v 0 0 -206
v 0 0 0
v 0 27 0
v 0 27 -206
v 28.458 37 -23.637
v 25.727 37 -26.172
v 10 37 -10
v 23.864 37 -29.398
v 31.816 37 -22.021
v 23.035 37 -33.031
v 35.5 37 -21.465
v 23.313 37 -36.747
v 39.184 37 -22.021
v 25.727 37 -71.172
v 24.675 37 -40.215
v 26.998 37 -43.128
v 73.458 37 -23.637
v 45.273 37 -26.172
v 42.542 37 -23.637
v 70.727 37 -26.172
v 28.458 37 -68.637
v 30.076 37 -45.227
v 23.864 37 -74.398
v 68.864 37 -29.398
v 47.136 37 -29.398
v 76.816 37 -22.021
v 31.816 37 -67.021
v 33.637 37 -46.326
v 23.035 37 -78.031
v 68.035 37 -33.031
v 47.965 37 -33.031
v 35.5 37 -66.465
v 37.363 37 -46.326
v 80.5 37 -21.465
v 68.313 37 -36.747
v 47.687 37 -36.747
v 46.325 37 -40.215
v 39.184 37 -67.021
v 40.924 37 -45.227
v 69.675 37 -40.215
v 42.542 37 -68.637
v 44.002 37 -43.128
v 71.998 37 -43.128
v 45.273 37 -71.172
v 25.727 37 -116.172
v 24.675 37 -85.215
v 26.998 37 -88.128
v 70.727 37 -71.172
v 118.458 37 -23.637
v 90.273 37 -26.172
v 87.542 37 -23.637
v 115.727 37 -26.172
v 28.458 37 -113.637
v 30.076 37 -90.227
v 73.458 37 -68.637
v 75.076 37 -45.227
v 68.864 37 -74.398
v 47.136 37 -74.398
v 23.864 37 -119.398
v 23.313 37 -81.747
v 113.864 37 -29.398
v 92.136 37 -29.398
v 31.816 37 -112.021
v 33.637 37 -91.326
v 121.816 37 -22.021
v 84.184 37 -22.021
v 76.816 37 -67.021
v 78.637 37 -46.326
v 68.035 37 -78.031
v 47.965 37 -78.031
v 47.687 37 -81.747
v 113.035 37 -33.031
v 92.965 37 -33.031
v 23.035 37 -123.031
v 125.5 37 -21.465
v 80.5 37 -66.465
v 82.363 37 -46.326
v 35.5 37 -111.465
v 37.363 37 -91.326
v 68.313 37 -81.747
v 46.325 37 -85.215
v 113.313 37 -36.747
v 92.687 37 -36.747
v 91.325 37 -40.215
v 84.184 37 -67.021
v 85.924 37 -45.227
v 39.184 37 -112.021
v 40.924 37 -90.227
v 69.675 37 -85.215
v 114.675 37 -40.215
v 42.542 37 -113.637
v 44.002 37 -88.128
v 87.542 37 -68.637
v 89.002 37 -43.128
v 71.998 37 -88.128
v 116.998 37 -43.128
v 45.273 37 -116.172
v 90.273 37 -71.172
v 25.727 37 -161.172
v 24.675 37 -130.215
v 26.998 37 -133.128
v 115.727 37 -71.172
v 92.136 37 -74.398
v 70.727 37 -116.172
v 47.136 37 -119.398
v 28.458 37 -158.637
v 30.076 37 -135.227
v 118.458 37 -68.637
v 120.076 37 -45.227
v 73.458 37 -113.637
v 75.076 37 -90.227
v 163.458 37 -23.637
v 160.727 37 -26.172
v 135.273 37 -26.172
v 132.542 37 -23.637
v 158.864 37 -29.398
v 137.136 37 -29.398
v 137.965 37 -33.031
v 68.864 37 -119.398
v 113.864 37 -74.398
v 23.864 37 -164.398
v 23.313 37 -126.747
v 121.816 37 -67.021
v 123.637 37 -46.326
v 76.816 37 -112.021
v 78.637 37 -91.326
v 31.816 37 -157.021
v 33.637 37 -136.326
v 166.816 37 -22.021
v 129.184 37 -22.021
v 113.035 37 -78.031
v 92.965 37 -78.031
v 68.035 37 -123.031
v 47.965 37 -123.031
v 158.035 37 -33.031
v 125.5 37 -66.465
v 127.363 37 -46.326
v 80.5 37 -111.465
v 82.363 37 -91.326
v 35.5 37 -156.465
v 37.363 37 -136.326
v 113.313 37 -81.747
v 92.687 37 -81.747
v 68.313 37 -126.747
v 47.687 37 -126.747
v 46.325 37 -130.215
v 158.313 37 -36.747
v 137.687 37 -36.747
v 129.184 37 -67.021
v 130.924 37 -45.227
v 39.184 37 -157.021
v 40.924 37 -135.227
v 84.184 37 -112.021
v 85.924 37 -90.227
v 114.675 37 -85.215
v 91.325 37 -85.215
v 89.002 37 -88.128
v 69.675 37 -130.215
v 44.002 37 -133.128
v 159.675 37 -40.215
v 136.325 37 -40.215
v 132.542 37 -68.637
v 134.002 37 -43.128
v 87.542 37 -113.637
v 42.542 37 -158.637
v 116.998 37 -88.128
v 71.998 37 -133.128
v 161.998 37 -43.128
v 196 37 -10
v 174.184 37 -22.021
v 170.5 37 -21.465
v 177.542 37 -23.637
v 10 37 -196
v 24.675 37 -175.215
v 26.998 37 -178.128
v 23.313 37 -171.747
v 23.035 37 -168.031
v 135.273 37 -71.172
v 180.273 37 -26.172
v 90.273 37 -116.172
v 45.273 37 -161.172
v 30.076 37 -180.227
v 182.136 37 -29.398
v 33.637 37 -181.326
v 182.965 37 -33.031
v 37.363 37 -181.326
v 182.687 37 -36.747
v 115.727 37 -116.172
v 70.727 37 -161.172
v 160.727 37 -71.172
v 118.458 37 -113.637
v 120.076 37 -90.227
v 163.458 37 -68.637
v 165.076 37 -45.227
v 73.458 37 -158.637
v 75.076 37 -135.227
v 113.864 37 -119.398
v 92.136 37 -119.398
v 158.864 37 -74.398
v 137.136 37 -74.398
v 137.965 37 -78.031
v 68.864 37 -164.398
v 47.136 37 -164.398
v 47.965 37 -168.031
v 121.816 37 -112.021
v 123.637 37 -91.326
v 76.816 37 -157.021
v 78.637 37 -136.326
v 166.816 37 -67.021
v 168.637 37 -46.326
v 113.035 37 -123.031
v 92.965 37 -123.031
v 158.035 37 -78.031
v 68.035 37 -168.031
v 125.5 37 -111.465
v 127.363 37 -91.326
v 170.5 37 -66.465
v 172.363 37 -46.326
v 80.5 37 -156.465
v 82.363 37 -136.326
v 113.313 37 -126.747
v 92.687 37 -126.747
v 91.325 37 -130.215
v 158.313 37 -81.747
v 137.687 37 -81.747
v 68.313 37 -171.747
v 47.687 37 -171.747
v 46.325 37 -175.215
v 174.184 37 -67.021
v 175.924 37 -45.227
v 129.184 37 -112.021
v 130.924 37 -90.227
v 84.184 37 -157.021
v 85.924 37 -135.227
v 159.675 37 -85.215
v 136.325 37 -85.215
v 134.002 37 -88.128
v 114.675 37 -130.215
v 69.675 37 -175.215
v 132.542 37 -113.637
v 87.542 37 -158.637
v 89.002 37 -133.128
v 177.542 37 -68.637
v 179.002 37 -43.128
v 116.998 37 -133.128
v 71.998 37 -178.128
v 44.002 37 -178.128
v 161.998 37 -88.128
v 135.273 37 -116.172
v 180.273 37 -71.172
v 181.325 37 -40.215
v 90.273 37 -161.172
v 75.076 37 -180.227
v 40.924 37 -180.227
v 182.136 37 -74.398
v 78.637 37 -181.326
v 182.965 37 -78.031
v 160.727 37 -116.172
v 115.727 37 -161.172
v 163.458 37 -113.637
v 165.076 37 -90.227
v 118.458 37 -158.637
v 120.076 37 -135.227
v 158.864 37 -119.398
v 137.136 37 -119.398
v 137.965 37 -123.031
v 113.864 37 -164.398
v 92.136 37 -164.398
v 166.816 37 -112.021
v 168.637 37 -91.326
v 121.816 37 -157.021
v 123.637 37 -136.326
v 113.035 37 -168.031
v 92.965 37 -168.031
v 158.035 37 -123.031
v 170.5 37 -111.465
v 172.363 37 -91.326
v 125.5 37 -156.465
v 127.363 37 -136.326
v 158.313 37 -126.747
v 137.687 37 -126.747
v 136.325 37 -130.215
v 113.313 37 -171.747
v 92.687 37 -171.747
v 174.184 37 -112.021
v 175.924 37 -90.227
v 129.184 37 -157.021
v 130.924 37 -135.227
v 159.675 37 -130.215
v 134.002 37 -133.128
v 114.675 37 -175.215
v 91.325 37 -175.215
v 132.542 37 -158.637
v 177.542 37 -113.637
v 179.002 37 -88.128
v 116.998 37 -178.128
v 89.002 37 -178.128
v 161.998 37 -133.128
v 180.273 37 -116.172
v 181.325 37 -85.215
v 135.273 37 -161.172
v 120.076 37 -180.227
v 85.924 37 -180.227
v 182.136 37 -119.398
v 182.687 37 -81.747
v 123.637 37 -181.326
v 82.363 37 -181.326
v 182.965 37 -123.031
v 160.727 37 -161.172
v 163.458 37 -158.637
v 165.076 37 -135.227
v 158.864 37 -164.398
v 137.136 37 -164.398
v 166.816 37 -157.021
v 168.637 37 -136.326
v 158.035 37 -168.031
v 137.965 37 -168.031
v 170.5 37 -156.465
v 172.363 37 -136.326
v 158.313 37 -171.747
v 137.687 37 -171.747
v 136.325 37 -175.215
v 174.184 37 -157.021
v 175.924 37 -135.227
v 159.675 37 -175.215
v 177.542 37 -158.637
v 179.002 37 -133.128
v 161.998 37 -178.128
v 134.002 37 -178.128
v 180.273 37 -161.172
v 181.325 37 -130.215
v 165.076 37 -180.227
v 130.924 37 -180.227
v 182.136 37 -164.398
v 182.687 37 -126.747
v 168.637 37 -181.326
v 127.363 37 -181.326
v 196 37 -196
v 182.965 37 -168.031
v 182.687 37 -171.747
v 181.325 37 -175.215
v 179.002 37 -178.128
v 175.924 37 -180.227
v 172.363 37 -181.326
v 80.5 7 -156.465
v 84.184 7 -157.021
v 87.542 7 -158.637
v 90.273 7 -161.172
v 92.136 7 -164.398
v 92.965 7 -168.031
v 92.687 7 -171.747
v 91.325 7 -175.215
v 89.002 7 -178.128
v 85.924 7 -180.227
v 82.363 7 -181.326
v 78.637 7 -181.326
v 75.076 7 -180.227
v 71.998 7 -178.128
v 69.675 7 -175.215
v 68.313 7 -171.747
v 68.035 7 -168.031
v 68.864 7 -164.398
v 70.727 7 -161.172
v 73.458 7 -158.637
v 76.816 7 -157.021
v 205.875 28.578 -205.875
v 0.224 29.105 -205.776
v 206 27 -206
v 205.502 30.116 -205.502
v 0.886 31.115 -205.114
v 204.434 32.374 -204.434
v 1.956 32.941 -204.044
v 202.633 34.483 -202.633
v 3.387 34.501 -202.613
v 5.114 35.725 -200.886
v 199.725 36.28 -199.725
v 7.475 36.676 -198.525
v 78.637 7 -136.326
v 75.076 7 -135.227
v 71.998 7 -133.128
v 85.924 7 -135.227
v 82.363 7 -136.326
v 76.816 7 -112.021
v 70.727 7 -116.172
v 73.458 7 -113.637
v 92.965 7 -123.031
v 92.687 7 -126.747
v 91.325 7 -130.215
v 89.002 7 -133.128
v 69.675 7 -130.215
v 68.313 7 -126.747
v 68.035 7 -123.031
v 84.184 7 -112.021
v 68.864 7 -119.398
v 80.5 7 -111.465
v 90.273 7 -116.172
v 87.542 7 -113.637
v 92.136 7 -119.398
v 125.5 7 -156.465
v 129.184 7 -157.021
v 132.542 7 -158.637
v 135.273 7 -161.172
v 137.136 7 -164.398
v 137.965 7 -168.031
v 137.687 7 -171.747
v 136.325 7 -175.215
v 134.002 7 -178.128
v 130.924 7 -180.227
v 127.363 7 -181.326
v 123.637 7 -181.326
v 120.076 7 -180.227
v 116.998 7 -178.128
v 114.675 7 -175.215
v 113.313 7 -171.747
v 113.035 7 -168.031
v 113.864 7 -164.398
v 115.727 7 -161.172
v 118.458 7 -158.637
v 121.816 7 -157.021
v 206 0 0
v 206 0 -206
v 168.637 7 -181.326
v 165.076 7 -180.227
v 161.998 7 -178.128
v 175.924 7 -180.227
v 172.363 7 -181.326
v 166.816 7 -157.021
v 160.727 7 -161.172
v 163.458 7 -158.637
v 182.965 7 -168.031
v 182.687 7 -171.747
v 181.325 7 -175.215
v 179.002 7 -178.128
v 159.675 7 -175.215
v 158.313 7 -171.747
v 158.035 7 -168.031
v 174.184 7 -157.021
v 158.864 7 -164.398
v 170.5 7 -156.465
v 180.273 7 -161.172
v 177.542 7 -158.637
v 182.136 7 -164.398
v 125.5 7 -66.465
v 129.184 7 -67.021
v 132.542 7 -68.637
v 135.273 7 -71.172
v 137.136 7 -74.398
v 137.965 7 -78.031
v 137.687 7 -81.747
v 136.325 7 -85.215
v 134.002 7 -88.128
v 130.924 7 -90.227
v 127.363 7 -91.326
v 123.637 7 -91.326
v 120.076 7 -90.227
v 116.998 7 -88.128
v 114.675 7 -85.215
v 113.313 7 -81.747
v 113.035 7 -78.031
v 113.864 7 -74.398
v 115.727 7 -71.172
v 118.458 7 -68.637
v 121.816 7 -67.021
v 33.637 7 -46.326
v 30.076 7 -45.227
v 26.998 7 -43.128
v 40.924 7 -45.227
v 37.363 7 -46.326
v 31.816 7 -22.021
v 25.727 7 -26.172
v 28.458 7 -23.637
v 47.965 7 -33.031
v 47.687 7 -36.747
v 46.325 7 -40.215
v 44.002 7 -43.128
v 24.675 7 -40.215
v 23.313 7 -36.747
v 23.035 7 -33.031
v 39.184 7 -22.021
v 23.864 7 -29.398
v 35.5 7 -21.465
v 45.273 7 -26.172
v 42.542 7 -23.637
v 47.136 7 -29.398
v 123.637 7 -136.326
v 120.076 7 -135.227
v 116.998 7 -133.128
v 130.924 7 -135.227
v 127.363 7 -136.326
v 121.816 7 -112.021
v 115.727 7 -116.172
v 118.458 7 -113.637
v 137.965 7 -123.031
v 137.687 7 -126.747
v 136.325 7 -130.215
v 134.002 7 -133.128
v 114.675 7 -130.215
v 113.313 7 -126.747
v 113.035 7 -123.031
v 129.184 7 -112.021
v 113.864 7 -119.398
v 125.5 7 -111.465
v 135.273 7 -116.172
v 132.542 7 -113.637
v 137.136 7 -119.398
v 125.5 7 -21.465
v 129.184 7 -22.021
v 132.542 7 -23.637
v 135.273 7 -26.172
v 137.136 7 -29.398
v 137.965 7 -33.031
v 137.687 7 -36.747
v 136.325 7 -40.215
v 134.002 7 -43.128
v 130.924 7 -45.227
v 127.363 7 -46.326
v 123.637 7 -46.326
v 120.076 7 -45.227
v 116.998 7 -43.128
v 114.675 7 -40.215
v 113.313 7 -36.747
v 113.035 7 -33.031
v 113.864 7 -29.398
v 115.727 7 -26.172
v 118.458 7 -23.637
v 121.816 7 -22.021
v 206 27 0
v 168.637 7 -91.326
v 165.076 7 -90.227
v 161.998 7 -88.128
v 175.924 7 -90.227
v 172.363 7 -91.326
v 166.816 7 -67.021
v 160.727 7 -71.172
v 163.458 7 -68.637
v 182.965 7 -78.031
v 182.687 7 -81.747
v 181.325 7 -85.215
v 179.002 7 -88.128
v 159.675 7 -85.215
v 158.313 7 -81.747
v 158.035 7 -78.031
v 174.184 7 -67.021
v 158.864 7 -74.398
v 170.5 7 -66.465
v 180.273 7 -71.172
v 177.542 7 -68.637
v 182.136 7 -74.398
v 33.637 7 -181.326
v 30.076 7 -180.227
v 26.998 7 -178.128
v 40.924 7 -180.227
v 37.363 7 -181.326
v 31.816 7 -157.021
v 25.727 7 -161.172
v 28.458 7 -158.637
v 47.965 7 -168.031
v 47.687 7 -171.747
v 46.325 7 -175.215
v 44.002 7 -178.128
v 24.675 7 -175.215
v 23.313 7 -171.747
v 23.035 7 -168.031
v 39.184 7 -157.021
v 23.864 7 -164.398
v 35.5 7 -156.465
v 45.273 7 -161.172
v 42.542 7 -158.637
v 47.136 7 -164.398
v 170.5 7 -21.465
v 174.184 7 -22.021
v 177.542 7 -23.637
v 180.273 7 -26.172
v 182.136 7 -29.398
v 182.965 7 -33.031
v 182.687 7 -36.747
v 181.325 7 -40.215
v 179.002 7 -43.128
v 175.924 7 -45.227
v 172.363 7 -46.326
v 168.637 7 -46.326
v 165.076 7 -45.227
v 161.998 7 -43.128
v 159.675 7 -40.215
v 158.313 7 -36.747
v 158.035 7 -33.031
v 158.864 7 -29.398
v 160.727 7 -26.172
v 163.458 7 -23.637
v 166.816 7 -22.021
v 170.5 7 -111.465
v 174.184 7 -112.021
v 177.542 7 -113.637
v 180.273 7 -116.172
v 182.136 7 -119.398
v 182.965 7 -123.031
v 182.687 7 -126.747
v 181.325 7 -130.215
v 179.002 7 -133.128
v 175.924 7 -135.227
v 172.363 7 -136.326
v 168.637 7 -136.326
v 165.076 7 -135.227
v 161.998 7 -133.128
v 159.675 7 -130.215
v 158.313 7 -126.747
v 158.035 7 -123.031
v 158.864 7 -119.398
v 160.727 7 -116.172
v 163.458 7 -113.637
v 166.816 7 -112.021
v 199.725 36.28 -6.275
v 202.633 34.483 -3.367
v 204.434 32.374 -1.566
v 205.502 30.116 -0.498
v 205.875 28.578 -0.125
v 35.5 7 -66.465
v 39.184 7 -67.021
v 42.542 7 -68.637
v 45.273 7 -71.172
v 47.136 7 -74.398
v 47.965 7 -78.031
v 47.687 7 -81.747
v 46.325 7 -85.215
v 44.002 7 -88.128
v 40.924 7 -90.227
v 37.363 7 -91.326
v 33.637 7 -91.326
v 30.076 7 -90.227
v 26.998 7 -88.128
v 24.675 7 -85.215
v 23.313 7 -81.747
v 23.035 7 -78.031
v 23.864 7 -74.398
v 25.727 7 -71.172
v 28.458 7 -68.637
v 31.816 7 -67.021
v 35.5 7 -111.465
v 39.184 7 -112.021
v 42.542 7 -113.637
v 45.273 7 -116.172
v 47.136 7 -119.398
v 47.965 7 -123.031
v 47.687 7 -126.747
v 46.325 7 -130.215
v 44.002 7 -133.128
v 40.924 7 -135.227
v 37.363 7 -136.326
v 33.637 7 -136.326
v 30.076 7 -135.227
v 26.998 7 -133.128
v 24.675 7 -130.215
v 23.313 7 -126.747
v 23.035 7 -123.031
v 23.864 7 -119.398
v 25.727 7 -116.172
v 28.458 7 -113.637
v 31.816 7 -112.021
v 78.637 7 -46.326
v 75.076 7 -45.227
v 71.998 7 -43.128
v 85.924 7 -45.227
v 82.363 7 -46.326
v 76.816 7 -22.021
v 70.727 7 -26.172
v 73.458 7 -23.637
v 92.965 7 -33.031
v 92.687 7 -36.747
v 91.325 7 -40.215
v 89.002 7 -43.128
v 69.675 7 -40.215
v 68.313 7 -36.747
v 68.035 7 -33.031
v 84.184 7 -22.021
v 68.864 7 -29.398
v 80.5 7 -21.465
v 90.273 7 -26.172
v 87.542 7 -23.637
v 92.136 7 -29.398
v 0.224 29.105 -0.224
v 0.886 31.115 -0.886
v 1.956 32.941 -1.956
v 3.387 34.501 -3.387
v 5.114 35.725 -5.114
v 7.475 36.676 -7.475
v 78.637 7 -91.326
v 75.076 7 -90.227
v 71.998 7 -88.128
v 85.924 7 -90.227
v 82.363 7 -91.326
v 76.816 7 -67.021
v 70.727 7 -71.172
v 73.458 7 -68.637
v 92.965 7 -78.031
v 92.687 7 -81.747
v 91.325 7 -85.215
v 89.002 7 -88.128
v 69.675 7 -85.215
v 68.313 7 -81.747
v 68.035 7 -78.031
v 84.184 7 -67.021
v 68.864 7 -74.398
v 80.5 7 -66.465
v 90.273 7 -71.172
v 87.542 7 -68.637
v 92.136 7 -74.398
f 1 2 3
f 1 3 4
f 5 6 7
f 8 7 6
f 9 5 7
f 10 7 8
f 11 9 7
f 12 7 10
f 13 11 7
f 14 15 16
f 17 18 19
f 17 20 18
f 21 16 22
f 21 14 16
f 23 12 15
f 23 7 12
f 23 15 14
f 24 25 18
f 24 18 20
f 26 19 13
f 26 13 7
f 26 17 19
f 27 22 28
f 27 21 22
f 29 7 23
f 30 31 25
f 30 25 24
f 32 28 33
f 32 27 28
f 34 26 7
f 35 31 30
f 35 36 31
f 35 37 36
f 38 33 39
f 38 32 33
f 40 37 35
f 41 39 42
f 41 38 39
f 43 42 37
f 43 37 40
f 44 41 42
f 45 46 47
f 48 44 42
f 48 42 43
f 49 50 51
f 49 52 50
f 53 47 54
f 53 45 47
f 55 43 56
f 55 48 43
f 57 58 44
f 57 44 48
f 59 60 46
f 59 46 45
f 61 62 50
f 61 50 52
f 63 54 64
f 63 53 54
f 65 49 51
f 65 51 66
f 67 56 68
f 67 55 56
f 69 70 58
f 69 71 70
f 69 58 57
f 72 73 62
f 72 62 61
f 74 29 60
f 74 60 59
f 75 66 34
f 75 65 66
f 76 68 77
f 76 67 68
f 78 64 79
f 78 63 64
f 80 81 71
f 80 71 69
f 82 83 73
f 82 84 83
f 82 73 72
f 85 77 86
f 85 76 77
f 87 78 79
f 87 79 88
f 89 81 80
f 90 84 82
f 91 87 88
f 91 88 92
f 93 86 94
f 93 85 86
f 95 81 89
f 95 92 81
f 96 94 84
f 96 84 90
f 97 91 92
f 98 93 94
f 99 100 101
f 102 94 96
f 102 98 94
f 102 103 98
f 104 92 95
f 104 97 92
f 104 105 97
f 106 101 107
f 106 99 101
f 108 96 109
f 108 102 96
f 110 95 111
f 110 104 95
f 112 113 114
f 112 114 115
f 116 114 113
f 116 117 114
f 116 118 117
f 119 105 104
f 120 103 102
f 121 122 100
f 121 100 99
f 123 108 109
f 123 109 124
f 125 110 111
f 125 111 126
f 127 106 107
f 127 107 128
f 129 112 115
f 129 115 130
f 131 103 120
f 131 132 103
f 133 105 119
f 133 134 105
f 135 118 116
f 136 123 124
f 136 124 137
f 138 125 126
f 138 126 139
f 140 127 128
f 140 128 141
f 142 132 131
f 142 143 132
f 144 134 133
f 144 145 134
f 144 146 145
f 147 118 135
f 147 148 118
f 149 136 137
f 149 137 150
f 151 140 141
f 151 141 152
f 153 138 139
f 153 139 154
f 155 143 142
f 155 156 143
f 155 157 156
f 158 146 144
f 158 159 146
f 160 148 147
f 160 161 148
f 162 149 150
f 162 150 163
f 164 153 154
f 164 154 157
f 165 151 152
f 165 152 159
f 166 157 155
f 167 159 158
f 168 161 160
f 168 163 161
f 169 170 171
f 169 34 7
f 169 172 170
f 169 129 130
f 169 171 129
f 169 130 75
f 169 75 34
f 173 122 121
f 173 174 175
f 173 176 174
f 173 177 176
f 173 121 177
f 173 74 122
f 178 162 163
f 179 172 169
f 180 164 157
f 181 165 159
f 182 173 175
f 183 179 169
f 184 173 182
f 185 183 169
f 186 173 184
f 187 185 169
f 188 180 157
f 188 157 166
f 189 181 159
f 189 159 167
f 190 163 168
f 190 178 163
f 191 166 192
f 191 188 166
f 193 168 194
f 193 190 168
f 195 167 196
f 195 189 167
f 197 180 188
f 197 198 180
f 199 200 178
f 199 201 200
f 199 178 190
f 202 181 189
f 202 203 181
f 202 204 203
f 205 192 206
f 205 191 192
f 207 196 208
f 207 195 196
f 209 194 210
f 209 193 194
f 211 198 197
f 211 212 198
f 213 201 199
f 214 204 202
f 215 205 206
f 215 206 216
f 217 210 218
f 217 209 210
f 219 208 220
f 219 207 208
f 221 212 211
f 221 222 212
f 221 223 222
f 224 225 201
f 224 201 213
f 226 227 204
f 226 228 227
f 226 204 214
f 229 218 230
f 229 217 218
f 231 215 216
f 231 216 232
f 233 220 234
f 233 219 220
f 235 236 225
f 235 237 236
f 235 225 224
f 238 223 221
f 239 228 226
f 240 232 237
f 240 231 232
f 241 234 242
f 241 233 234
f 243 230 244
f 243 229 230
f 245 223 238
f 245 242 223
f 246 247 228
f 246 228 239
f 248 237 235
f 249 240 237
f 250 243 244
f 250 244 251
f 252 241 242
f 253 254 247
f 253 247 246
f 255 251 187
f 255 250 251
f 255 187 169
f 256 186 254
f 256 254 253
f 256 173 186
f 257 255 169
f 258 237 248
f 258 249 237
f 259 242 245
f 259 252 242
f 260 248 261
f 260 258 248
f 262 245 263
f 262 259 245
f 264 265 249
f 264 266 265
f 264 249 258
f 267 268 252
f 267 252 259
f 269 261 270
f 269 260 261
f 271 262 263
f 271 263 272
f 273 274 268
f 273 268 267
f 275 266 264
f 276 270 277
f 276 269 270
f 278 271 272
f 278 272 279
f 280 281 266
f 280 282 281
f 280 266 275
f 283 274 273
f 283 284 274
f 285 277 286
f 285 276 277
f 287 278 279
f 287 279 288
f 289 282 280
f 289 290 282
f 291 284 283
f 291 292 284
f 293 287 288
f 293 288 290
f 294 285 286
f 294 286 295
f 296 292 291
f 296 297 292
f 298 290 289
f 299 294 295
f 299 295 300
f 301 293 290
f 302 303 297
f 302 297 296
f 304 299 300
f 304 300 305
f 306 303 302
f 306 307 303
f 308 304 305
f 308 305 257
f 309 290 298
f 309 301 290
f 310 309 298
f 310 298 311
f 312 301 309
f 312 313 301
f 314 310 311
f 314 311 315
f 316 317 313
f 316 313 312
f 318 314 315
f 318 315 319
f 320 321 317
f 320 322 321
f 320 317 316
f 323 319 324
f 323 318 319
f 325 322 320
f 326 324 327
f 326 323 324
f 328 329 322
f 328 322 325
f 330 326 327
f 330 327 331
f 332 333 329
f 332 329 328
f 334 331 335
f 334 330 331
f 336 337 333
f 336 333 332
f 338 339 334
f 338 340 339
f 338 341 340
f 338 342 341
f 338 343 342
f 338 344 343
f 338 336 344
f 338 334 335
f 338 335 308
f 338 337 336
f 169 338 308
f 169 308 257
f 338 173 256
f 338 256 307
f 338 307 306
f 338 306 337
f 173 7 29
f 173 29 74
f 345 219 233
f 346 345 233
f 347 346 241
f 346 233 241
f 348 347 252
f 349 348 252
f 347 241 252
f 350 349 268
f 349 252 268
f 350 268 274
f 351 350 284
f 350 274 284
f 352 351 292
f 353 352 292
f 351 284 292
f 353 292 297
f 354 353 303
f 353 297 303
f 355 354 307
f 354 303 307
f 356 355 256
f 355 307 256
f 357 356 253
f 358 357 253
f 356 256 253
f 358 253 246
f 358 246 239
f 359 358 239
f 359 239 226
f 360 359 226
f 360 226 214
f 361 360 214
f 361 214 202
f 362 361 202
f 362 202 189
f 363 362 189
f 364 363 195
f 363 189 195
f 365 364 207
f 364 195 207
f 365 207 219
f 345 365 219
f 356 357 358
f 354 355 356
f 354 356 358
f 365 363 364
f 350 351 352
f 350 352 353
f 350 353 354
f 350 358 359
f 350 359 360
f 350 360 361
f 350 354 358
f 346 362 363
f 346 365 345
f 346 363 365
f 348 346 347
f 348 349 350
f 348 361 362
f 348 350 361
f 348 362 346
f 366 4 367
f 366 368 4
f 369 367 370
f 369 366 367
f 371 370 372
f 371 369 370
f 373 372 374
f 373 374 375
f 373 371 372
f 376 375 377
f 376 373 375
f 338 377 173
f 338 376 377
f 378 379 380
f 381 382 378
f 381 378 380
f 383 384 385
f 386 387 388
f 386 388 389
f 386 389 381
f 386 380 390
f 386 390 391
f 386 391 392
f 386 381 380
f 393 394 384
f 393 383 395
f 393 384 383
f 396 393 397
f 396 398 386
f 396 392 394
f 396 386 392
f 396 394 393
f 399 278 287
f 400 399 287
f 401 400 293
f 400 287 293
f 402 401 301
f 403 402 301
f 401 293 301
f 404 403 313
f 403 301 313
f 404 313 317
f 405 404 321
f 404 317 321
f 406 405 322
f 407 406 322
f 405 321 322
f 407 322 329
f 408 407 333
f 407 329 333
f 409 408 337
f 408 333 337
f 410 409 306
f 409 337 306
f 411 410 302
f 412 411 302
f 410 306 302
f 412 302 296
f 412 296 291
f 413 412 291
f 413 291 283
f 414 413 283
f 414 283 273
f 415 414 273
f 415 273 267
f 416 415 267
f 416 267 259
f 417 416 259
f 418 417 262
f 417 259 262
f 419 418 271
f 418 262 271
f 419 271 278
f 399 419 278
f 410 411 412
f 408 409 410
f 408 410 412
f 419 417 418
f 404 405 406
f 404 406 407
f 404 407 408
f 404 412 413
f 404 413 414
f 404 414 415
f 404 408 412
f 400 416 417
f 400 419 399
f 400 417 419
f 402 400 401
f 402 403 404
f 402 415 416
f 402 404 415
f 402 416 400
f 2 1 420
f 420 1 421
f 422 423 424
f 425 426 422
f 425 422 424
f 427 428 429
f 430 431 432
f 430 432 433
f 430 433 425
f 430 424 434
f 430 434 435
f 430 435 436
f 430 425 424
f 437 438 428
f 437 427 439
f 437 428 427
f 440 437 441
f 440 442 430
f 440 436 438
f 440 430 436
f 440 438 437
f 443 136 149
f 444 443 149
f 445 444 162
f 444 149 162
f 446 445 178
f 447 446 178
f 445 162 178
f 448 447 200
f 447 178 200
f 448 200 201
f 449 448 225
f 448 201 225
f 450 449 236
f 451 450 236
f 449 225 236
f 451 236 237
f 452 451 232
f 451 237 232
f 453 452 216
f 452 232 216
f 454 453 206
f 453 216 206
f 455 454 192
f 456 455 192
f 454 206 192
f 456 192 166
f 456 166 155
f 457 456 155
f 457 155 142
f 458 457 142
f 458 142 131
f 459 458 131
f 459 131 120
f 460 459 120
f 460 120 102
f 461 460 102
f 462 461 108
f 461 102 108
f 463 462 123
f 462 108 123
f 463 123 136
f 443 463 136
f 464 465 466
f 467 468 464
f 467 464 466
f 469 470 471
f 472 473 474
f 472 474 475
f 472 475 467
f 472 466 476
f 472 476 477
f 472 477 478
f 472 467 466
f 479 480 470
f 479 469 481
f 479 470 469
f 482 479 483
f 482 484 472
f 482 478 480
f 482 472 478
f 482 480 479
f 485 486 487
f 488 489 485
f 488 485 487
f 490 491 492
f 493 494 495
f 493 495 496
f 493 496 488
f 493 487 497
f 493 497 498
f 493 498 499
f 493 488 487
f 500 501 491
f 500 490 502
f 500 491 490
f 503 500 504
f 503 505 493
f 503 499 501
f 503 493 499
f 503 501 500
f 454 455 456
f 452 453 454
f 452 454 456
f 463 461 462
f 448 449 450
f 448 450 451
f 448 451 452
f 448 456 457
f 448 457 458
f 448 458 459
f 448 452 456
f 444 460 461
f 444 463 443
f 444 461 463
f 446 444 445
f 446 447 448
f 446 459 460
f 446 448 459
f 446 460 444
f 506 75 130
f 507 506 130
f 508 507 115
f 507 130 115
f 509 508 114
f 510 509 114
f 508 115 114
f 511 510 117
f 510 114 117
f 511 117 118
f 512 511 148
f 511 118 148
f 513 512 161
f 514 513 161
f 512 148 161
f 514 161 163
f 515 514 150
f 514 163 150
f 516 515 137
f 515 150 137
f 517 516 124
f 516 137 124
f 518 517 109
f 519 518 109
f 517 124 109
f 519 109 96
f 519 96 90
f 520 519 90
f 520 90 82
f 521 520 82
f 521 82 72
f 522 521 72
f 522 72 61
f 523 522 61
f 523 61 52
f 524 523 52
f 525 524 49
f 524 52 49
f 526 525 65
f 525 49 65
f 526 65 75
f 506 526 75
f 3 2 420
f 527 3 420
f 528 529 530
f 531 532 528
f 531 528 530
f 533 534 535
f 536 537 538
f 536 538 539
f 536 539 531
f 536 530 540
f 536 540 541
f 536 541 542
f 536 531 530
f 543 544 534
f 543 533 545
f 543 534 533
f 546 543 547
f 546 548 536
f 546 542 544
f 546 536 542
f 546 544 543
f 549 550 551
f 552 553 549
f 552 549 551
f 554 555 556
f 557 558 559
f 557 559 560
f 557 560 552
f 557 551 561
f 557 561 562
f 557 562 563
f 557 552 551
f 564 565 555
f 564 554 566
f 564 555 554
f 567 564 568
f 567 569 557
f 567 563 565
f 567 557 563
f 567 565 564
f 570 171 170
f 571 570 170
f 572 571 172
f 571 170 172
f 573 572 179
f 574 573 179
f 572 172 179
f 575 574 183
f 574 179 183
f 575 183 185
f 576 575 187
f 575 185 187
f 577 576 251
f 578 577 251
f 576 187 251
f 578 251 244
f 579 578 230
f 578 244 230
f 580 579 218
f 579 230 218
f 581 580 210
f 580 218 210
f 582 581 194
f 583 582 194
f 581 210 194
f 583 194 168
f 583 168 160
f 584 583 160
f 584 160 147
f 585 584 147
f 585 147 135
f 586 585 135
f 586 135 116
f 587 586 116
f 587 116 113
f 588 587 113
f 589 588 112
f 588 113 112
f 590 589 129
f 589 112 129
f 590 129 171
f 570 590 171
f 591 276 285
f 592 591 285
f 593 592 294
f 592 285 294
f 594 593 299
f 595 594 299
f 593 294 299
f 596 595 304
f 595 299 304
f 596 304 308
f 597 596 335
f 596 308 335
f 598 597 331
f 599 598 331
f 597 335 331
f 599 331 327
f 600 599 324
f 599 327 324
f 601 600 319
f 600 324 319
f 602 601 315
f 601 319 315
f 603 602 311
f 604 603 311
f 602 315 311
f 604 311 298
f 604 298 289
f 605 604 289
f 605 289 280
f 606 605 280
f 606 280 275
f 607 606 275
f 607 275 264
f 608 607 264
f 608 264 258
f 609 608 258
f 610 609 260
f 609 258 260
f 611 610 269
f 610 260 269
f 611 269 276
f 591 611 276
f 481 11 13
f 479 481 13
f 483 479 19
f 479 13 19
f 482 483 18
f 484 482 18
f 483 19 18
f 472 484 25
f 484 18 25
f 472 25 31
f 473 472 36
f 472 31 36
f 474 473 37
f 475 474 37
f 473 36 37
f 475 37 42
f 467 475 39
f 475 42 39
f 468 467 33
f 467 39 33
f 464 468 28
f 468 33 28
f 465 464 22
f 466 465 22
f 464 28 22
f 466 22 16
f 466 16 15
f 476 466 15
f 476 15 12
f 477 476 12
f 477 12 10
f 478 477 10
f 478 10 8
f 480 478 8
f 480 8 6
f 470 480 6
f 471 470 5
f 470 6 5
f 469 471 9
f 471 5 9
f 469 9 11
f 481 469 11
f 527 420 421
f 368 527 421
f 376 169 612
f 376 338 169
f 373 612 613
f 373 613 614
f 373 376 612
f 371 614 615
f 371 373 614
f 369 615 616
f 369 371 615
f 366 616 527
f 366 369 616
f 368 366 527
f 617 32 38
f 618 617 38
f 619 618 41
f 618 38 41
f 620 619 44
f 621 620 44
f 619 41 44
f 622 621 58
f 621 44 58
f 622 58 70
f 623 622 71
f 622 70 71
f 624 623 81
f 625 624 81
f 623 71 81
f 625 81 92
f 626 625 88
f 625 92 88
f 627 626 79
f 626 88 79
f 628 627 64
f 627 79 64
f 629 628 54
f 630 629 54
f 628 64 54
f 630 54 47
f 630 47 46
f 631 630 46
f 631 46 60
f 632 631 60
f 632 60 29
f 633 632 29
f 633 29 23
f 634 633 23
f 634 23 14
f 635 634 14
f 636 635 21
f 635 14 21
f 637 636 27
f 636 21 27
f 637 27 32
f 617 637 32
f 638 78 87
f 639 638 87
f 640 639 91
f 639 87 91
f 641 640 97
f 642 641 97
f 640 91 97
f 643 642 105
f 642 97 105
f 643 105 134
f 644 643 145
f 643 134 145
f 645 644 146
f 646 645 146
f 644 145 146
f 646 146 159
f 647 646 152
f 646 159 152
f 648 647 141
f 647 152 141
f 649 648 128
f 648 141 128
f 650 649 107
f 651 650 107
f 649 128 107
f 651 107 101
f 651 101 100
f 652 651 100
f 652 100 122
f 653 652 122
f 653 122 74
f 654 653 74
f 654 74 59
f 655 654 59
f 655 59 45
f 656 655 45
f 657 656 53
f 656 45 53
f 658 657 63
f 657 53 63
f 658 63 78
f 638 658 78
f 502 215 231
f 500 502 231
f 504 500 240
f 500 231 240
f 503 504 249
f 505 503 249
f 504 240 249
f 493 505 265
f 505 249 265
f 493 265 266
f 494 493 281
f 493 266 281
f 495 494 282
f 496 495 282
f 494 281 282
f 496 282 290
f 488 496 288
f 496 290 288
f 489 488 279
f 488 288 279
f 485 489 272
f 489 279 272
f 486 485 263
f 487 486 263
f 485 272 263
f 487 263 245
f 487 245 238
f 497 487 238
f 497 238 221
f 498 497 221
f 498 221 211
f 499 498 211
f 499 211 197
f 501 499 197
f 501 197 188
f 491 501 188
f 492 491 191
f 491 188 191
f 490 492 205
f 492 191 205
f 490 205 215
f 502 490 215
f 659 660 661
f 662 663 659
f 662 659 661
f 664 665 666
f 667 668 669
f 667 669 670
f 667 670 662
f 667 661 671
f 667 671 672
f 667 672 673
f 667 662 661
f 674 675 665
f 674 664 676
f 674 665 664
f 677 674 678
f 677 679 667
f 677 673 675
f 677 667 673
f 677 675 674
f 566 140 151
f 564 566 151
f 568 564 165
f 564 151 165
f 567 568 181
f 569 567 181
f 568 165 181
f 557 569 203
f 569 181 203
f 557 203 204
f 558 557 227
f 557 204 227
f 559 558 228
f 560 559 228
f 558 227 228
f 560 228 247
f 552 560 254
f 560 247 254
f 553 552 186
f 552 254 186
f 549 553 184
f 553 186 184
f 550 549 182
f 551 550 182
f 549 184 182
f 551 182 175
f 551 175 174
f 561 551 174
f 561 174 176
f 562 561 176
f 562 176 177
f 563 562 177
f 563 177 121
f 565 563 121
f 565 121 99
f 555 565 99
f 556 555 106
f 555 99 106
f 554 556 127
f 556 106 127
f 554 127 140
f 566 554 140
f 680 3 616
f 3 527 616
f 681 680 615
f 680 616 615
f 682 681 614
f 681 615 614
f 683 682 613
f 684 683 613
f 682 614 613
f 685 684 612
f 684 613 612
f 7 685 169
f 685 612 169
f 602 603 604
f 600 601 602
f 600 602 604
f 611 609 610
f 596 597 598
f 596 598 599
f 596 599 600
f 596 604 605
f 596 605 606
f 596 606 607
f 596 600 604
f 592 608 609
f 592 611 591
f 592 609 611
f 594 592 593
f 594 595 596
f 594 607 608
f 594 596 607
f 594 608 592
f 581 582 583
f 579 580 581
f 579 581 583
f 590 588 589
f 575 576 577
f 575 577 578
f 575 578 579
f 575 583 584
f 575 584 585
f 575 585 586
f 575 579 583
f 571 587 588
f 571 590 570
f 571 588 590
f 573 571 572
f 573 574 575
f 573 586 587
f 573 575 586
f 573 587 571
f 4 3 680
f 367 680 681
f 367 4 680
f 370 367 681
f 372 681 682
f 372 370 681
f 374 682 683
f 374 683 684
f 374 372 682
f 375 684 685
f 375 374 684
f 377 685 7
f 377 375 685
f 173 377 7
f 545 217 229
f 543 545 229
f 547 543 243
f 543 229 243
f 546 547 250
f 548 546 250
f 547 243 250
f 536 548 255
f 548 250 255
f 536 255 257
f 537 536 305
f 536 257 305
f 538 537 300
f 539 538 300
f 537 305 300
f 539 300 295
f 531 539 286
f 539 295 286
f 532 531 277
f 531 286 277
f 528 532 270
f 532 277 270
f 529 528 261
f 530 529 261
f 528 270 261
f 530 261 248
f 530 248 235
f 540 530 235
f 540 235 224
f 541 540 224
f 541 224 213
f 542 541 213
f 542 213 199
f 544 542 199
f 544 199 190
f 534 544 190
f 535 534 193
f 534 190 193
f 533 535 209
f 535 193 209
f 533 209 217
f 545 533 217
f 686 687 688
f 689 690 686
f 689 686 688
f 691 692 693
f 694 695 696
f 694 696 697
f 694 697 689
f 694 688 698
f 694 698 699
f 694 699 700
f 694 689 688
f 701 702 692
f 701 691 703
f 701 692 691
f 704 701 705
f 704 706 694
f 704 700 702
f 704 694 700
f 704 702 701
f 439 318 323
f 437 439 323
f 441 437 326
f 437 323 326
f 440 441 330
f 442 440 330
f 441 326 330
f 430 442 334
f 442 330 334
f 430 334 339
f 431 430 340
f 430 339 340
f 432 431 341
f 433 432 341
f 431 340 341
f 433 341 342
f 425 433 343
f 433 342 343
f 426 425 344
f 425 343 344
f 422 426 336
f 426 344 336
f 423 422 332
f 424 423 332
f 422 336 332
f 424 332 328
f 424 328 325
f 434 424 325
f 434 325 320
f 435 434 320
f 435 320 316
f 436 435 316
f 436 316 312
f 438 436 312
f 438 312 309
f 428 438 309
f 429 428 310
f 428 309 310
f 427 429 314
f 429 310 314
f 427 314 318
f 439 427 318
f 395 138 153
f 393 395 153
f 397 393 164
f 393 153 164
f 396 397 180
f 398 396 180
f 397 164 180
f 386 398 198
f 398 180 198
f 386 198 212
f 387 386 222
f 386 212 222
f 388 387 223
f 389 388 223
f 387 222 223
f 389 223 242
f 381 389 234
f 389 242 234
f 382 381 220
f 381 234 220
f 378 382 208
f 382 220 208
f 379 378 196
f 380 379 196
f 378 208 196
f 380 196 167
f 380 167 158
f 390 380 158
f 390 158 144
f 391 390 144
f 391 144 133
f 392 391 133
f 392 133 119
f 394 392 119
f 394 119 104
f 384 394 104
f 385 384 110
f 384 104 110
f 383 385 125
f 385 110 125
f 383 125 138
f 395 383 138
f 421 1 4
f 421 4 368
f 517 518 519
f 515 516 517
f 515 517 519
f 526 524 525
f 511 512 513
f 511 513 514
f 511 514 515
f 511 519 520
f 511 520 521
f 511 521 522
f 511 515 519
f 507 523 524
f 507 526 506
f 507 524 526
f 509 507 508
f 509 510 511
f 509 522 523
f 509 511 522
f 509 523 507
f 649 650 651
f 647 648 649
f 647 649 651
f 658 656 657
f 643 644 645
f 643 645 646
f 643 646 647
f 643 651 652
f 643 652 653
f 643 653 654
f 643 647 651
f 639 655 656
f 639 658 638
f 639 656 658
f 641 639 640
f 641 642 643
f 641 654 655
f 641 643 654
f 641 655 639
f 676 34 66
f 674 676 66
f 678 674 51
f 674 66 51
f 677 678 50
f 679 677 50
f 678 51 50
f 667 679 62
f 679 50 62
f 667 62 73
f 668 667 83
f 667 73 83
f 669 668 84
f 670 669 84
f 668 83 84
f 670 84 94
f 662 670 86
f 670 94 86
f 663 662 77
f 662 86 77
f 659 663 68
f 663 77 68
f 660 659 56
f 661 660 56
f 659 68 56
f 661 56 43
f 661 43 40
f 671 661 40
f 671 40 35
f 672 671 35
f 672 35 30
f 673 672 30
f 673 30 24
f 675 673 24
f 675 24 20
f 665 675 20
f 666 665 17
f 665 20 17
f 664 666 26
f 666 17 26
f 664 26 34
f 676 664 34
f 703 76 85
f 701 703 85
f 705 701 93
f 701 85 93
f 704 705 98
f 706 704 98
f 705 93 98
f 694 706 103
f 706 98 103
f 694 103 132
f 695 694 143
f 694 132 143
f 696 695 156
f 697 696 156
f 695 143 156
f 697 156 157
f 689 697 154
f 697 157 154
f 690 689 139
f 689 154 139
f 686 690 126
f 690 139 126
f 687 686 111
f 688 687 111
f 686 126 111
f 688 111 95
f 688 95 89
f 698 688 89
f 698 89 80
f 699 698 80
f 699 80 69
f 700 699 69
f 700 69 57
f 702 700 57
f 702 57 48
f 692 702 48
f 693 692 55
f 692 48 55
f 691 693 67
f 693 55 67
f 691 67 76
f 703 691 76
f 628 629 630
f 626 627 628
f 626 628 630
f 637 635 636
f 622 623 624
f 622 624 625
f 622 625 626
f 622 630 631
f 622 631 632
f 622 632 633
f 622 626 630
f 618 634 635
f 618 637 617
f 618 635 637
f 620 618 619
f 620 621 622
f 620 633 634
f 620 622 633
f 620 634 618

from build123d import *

# Parameters (mm, degrees)
SKETCH1_W           = 206
SKETCH1_H           = 206
BOSS_EXTRUDE1_DEPTH = 37
SKETCH2_R           = 12.5
CUT_EXTRUDE1_DEPTH  = 30
LPATTERN1_COUNT     = 4
LPATTERN1_PITCH     = 45
FILLET2_R           = 10


with BuildPart() as part:
    # Sketch1 → Boss-Extrude1 (new body)
    with BuildSketch(Plane(origin=(0, 0, 0), x_dir=(1, 0, 0), z_dir=(0, 1, 0))):
        with Locations((103, 103)):
            Rectangle(SKETCH1_W, SKETCH1_H)
    extrude(amount=BOSS_EXTRUDE1_DEPTH)

    # Sketch2 → Cut-Extrude1 (cut)
    with BuildSketch(Plane(origin=(0, 37, 0), x_dir=(1, 0, 0), z_dir=(0, 1, 0))):
        with Locations(Location((80.5, 168.965188792, 0), (0, 0, 270))):
            Circle(SKETCH2_R)
        with Locations(Location((35.5, 168.965188792, 0), (0, 0, 270))):
            Circle(SKETCH2_R)
        with Locations(Location((125.5, 168.965188792, 0), (0, 0, 270))):
            Circle(SKETCH2_R)
        with Locations(Location((170.5, 168.965188792, 0), (0, 0, 270))):
            Circle(SKETCH2_R)
    cut_extrude1 = extrude(amount=-CUT_EXTRUDE1_DEPTH, mode=Mode.SUBTRACT)

    # LPattern1: Cut-Extrude1 ×4
    with Locations(*[(0, 0, i * LPATTERN1_PITCH) for i in range(1, LPATTERN1_COUNT)]):
        add(cut_extrude1, mode=Mode.SUBTRACT)

    # Fillet2
    fillet2_edges = [part.edges().sort_by_distance(p)[0] for p in [
        (206, 37, -103),
        (103, 37, -206),
        (0, 37, -103),
        (103, 37, 0),
    ]]
    fillet(fillet2_edges, radius=FILLET2_R)


solid = part.part
